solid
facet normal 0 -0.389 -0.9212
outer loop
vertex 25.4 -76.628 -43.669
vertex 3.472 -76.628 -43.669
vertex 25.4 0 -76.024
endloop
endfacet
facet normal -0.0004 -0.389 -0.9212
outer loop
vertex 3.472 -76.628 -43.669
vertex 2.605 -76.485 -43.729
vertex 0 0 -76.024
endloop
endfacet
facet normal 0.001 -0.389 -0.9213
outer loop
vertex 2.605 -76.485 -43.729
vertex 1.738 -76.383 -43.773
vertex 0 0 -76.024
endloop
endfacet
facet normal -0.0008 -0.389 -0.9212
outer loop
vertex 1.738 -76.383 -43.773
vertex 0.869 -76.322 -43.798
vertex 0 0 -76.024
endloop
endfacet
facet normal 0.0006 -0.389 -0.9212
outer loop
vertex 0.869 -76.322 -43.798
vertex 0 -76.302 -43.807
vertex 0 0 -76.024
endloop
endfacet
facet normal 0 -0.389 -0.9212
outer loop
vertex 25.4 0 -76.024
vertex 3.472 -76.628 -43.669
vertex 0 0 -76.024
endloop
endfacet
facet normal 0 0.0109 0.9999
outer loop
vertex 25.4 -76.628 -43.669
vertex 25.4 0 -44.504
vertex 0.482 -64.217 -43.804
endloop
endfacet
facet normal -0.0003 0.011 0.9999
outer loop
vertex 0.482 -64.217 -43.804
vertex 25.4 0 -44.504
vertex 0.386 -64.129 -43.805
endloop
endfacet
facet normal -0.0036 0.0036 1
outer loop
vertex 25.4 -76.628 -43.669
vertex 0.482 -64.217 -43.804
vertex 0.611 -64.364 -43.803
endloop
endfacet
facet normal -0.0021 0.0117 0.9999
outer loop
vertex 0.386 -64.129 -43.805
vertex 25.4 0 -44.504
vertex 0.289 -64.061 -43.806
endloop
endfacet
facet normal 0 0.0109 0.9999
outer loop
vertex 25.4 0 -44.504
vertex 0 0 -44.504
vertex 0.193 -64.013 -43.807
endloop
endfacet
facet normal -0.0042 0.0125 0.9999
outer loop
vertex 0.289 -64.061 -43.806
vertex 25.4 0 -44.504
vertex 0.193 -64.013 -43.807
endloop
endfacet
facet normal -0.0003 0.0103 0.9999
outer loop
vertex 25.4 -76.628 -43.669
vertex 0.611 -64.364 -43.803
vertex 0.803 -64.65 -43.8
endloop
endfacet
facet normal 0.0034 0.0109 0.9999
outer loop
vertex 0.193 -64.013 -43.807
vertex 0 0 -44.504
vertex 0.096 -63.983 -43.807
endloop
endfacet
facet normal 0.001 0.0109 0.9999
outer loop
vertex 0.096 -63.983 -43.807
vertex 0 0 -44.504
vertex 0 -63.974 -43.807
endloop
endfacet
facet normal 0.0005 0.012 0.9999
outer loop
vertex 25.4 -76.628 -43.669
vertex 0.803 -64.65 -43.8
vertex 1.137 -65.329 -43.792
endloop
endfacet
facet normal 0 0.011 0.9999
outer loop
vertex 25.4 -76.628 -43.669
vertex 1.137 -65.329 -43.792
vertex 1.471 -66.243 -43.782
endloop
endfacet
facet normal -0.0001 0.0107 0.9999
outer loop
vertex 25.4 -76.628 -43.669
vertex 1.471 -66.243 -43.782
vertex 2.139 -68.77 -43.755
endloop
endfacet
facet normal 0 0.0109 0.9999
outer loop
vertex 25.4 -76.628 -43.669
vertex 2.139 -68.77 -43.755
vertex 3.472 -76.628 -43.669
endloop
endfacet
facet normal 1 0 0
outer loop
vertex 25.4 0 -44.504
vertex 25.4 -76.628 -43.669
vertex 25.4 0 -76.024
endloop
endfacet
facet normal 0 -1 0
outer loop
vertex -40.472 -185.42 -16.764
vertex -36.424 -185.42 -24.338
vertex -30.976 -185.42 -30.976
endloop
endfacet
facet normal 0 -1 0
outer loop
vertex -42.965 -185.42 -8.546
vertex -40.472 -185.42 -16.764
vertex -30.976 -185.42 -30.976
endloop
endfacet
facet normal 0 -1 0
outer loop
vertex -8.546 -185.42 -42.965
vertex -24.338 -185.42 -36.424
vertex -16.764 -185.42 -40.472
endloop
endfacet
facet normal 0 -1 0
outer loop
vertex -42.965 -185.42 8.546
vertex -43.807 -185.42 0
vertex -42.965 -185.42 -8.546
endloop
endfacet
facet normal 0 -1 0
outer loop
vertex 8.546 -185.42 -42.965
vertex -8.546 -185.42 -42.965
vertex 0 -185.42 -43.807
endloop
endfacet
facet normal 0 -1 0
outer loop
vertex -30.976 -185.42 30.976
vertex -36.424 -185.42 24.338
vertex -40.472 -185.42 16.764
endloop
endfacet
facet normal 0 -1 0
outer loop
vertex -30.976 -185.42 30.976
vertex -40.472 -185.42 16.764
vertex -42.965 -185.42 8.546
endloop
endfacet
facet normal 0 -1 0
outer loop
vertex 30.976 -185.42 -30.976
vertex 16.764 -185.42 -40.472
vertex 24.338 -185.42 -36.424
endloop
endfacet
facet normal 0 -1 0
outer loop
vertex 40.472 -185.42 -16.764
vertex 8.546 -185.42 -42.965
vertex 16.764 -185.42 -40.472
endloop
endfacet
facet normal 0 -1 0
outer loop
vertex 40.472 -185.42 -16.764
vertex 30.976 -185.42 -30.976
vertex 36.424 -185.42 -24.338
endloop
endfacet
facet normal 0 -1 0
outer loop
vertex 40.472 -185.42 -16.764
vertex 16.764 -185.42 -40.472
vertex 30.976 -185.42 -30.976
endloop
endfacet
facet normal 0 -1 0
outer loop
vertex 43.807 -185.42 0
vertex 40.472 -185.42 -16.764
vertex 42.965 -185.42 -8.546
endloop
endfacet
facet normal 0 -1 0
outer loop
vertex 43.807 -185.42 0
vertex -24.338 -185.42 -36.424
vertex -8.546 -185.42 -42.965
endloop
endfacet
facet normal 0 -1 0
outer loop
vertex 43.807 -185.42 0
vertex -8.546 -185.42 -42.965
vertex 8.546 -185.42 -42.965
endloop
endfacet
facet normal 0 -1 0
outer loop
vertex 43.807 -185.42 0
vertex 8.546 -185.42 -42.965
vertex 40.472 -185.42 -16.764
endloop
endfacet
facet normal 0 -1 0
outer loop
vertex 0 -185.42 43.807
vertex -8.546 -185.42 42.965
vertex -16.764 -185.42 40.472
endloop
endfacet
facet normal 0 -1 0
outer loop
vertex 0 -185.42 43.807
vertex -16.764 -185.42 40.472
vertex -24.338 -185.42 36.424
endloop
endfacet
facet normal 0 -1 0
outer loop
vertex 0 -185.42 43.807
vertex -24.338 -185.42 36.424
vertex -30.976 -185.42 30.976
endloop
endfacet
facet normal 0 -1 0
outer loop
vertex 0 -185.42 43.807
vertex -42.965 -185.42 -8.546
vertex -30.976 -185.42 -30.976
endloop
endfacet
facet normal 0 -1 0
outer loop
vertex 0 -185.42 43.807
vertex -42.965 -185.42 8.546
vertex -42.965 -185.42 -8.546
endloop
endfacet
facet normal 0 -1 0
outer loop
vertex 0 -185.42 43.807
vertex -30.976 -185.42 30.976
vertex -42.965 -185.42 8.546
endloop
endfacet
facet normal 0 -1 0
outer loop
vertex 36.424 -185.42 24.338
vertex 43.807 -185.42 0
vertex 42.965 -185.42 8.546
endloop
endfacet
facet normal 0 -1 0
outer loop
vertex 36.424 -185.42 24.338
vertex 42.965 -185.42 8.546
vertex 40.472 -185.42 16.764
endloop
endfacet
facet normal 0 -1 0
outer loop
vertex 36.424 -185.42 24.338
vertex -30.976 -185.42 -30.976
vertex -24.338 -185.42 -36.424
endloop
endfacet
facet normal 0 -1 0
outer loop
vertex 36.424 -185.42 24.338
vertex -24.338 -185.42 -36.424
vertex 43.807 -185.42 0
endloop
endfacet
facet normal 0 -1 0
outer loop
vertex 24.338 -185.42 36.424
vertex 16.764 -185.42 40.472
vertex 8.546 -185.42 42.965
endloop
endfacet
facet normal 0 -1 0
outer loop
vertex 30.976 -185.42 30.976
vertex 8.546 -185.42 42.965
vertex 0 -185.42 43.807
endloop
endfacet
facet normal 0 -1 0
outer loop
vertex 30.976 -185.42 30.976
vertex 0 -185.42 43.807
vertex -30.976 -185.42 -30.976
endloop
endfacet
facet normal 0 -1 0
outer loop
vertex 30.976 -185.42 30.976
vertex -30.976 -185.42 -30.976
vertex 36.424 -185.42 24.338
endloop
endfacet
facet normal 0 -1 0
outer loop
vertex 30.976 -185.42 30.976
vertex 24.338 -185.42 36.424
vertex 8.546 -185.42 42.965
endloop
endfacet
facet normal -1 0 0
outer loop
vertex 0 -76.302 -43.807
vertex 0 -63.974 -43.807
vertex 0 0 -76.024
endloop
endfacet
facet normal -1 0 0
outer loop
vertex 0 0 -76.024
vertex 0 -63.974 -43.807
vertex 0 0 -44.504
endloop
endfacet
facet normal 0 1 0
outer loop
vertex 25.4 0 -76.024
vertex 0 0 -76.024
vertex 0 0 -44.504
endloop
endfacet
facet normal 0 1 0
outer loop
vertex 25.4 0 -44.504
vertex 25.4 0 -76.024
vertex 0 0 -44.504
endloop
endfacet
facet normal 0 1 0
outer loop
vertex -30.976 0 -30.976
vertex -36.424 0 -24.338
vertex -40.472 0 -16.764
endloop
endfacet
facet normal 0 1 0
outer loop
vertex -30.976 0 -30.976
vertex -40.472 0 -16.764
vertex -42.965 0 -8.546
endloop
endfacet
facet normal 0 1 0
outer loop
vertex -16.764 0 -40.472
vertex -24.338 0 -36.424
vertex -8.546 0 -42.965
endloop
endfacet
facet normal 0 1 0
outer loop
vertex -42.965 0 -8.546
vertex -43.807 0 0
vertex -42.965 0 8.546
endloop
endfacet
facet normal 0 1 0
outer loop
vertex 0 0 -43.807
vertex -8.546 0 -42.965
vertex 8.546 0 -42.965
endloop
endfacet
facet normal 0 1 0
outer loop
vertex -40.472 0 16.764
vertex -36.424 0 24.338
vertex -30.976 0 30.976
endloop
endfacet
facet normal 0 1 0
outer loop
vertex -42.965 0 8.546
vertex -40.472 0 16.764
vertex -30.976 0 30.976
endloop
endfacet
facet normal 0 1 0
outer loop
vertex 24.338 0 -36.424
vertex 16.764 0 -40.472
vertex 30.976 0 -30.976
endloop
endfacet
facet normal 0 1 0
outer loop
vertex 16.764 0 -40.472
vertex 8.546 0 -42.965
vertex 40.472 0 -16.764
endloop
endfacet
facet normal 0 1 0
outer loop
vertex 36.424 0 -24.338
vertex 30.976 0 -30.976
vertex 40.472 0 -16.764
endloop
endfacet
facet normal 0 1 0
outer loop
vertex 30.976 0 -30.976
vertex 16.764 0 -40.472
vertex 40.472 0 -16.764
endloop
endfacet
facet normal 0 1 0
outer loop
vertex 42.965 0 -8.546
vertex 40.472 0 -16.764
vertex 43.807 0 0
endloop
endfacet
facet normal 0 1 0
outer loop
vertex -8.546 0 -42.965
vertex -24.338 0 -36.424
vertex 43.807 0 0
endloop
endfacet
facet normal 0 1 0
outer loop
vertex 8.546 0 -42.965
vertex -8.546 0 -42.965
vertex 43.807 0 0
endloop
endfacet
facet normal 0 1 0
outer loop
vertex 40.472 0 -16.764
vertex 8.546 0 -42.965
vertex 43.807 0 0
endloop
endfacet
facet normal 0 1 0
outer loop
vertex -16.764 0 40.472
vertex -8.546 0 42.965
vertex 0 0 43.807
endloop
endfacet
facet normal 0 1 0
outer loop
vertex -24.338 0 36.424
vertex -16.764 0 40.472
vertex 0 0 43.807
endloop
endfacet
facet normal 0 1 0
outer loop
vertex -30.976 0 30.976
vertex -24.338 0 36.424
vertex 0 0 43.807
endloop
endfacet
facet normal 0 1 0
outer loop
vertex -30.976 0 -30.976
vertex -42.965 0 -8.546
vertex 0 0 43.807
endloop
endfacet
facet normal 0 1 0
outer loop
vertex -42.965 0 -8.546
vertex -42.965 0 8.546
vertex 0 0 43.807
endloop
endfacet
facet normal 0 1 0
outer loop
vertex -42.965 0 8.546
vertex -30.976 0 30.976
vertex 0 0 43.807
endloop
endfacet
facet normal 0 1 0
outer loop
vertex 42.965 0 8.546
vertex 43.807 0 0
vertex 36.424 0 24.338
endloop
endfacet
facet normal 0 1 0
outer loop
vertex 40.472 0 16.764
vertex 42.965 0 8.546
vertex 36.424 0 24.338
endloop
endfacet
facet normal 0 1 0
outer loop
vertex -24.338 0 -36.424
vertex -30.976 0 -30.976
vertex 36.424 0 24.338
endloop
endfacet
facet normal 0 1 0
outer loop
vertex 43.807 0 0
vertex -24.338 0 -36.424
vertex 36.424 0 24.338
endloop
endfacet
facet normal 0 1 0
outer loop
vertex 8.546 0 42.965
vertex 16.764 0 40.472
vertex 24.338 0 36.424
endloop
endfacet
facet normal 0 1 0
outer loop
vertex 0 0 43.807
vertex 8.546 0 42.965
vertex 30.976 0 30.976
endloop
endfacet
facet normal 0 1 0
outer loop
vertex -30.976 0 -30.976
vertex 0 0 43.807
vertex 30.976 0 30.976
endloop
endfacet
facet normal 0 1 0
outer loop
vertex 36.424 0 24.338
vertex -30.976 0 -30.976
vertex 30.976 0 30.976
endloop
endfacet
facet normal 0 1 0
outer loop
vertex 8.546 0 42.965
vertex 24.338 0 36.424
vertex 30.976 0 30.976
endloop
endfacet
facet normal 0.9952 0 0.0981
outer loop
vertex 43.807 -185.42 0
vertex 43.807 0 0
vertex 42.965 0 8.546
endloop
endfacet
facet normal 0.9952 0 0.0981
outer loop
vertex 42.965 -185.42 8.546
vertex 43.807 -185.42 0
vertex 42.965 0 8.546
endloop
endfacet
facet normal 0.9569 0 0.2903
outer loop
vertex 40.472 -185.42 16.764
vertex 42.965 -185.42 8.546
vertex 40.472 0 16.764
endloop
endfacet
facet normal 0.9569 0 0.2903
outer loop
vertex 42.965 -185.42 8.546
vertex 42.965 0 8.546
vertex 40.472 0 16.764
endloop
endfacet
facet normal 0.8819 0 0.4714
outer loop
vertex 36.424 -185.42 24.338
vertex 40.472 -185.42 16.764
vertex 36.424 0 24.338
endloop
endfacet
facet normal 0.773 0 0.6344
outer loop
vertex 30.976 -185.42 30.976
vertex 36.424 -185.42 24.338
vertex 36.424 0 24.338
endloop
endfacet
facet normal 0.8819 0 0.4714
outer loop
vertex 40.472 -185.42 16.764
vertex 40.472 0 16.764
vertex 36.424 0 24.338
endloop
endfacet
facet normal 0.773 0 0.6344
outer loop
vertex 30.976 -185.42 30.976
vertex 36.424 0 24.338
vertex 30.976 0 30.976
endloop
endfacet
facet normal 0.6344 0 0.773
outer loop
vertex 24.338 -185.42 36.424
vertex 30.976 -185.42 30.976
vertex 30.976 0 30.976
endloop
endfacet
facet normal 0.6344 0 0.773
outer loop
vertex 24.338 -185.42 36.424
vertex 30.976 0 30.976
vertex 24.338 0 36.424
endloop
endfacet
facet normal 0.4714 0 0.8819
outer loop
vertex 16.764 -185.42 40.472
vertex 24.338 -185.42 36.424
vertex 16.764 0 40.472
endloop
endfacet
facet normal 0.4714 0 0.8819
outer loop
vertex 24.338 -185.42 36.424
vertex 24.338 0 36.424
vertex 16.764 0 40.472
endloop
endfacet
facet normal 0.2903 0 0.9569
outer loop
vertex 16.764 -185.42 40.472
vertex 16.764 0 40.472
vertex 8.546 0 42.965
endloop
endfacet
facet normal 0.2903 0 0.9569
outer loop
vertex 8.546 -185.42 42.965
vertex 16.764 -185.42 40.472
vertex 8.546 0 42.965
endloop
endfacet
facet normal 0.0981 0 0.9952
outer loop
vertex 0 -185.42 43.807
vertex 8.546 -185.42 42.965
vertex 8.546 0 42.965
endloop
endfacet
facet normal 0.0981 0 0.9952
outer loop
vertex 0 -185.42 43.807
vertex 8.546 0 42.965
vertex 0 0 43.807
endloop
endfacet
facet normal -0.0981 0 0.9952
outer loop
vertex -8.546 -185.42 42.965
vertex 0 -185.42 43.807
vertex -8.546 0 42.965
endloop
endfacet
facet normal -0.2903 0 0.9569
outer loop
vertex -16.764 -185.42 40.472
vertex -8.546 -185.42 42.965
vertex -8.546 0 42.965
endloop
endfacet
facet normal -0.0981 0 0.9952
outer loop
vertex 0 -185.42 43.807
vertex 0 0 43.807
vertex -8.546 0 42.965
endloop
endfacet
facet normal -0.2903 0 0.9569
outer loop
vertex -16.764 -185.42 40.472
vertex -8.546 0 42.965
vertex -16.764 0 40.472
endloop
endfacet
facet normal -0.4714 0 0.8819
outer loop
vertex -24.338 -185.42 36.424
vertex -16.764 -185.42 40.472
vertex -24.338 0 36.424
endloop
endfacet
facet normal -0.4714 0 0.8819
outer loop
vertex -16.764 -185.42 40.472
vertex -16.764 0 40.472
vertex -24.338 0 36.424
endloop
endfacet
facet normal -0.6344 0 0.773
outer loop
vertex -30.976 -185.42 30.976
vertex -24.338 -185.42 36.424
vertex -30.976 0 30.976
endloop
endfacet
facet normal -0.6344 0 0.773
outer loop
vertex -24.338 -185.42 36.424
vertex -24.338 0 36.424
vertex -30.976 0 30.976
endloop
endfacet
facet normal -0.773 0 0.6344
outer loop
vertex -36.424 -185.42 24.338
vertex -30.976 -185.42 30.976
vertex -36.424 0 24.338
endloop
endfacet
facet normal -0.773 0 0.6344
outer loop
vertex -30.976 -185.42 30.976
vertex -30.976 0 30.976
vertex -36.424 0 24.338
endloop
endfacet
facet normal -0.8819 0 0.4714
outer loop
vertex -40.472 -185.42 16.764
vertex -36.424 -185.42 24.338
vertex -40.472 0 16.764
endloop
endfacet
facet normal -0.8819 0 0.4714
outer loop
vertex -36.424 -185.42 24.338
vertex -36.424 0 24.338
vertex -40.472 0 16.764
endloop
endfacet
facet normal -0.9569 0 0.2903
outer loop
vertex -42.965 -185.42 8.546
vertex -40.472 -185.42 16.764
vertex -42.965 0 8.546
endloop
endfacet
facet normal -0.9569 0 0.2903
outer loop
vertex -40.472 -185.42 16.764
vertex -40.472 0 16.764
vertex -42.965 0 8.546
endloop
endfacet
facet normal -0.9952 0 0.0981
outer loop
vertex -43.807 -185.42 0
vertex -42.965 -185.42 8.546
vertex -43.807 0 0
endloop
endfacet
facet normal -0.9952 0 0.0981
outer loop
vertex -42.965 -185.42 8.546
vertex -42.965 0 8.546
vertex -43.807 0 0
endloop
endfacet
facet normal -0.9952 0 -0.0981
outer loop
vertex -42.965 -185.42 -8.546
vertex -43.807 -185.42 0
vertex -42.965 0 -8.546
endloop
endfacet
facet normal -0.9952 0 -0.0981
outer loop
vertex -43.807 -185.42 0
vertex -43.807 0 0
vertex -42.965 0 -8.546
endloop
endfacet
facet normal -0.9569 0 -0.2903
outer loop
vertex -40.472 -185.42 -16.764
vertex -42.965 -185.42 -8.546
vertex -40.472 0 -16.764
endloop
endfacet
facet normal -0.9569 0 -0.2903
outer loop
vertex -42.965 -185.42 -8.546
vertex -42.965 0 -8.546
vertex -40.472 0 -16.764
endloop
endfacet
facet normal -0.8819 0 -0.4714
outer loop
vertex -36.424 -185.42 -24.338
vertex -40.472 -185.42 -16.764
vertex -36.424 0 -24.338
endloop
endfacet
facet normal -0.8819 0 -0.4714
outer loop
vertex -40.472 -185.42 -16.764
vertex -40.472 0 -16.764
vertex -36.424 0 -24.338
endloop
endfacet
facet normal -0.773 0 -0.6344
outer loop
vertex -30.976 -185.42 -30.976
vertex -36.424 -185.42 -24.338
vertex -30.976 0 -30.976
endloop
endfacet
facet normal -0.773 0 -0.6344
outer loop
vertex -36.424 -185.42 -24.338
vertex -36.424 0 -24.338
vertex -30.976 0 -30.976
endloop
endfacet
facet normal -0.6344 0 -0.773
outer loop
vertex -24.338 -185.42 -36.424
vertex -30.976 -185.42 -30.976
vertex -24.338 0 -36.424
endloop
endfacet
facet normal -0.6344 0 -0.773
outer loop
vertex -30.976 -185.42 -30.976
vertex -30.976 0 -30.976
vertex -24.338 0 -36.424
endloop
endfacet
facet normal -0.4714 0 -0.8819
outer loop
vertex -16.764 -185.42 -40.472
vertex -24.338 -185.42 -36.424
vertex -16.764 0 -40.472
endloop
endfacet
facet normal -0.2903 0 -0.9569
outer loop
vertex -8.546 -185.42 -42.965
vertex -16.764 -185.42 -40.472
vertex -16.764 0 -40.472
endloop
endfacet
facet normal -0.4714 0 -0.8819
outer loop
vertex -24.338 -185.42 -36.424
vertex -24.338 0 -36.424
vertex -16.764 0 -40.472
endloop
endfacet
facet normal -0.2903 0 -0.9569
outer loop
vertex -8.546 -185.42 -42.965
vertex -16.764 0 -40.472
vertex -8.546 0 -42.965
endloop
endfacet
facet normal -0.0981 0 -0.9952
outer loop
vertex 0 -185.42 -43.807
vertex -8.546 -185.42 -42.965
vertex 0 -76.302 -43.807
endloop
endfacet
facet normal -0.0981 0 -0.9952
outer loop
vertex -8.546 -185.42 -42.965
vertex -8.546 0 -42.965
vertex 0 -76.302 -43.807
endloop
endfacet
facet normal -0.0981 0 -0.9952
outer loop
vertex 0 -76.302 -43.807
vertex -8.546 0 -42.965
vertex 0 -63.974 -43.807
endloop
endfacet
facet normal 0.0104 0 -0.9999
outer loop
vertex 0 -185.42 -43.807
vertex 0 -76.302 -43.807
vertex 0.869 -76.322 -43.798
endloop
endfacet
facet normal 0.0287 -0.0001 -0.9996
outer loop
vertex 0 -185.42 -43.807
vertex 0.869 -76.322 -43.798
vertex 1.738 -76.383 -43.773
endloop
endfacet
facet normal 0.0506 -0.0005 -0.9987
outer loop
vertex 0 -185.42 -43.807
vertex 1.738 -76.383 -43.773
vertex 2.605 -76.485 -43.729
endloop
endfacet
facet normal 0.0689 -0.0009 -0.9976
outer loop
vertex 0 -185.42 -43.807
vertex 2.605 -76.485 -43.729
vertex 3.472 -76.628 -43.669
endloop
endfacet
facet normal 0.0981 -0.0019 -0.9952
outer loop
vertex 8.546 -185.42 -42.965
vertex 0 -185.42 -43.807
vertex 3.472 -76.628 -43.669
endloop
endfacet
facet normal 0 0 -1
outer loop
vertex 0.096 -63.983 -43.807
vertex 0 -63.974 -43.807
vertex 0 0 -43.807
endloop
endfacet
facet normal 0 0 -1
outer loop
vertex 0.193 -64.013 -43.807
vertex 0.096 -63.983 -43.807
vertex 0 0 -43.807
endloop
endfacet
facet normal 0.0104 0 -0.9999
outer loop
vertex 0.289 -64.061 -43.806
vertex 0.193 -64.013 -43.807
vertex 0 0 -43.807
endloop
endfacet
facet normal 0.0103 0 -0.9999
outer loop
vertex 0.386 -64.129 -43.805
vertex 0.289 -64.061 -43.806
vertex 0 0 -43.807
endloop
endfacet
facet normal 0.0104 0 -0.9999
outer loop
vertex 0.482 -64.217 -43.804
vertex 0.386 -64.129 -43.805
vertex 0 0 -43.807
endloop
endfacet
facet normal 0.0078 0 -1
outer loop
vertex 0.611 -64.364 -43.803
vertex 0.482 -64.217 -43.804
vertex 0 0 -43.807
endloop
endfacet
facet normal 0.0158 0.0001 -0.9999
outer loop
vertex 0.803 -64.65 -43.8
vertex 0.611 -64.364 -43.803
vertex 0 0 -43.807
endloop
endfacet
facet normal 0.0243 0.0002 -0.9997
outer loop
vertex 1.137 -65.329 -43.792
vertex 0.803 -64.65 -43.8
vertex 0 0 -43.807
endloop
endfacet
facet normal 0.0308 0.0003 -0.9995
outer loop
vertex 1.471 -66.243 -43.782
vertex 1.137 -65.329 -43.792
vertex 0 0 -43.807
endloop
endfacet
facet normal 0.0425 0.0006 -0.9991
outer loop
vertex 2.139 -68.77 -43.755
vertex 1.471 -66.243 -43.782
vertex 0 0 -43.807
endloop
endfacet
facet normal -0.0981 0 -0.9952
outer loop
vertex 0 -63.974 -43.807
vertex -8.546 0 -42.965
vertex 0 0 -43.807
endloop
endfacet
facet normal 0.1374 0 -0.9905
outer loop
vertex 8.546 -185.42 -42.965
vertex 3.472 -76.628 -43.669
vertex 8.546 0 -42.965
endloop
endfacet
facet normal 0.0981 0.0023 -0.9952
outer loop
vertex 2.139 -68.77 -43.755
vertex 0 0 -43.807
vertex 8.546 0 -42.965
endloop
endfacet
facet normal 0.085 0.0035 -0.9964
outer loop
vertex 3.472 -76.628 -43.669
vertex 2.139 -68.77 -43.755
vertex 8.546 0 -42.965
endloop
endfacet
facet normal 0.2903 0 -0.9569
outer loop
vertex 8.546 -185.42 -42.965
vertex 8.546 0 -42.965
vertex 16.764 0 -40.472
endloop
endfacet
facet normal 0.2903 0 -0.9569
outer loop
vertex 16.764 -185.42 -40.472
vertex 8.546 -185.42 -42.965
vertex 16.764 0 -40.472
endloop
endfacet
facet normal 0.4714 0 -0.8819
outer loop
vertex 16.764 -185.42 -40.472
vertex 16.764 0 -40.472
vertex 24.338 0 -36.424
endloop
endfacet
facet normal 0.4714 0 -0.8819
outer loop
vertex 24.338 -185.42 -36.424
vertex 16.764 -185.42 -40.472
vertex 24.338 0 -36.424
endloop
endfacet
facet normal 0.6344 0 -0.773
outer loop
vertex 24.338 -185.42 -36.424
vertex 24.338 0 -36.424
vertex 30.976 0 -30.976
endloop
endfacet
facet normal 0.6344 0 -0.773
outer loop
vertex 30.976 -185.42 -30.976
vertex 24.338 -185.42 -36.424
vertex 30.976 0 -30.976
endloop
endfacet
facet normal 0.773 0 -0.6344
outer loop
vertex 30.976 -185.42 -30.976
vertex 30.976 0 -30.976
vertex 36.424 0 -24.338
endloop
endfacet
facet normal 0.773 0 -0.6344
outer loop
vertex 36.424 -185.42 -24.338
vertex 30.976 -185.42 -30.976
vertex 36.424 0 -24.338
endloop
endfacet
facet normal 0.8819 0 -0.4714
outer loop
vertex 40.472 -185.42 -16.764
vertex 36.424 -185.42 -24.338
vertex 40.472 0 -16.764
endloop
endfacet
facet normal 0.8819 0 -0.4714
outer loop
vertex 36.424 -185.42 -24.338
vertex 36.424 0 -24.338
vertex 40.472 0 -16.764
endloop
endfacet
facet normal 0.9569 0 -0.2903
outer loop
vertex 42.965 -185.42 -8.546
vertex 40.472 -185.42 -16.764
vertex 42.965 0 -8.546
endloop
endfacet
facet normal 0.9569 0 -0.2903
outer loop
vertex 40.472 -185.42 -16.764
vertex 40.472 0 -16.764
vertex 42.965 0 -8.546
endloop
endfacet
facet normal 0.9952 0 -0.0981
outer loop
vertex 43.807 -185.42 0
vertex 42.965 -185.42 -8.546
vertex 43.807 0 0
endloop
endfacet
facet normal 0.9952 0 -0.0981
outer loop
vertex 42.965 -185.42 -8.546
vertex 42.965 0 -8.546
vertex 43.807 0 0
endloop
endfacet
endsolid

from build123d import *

# Parameters (mm, degrees)
F0_R     = 43.8070462956
F1_DEPTH = 90.678
F2_DEPTH = 94.742
F7_DEPTH = 25.4


# Not quite as in the source:
# - the program builds the solid bodies; features that only make, move or delete a surface that nothing else refers to are left out


with BuildPart() as f1:
    # F0 (on Front) → F1 (new body)
    with BuildSketch(Plane.XZ):
        Circle(F0_R)
    extrude(amount=F1_DEPTH)

    # F2 (add): a face of the model
    f2_faces = [f1.faces().sort_by_distance(p)[0] for p in [
        (0, -90.678, 0),
    ]]
    extrude(f2_faces, amount=F2_DEPTH)

    # F4 (on Right) → F7 (join)
    with BuildSketch(Plane.YZ):
        Polygon((0, -44.503852725), (-76.628126204, -43.6692126095), (0, -76.0243907571), align=None)
    extrude(amount=F7_DEPTH)


solid = f1.part
